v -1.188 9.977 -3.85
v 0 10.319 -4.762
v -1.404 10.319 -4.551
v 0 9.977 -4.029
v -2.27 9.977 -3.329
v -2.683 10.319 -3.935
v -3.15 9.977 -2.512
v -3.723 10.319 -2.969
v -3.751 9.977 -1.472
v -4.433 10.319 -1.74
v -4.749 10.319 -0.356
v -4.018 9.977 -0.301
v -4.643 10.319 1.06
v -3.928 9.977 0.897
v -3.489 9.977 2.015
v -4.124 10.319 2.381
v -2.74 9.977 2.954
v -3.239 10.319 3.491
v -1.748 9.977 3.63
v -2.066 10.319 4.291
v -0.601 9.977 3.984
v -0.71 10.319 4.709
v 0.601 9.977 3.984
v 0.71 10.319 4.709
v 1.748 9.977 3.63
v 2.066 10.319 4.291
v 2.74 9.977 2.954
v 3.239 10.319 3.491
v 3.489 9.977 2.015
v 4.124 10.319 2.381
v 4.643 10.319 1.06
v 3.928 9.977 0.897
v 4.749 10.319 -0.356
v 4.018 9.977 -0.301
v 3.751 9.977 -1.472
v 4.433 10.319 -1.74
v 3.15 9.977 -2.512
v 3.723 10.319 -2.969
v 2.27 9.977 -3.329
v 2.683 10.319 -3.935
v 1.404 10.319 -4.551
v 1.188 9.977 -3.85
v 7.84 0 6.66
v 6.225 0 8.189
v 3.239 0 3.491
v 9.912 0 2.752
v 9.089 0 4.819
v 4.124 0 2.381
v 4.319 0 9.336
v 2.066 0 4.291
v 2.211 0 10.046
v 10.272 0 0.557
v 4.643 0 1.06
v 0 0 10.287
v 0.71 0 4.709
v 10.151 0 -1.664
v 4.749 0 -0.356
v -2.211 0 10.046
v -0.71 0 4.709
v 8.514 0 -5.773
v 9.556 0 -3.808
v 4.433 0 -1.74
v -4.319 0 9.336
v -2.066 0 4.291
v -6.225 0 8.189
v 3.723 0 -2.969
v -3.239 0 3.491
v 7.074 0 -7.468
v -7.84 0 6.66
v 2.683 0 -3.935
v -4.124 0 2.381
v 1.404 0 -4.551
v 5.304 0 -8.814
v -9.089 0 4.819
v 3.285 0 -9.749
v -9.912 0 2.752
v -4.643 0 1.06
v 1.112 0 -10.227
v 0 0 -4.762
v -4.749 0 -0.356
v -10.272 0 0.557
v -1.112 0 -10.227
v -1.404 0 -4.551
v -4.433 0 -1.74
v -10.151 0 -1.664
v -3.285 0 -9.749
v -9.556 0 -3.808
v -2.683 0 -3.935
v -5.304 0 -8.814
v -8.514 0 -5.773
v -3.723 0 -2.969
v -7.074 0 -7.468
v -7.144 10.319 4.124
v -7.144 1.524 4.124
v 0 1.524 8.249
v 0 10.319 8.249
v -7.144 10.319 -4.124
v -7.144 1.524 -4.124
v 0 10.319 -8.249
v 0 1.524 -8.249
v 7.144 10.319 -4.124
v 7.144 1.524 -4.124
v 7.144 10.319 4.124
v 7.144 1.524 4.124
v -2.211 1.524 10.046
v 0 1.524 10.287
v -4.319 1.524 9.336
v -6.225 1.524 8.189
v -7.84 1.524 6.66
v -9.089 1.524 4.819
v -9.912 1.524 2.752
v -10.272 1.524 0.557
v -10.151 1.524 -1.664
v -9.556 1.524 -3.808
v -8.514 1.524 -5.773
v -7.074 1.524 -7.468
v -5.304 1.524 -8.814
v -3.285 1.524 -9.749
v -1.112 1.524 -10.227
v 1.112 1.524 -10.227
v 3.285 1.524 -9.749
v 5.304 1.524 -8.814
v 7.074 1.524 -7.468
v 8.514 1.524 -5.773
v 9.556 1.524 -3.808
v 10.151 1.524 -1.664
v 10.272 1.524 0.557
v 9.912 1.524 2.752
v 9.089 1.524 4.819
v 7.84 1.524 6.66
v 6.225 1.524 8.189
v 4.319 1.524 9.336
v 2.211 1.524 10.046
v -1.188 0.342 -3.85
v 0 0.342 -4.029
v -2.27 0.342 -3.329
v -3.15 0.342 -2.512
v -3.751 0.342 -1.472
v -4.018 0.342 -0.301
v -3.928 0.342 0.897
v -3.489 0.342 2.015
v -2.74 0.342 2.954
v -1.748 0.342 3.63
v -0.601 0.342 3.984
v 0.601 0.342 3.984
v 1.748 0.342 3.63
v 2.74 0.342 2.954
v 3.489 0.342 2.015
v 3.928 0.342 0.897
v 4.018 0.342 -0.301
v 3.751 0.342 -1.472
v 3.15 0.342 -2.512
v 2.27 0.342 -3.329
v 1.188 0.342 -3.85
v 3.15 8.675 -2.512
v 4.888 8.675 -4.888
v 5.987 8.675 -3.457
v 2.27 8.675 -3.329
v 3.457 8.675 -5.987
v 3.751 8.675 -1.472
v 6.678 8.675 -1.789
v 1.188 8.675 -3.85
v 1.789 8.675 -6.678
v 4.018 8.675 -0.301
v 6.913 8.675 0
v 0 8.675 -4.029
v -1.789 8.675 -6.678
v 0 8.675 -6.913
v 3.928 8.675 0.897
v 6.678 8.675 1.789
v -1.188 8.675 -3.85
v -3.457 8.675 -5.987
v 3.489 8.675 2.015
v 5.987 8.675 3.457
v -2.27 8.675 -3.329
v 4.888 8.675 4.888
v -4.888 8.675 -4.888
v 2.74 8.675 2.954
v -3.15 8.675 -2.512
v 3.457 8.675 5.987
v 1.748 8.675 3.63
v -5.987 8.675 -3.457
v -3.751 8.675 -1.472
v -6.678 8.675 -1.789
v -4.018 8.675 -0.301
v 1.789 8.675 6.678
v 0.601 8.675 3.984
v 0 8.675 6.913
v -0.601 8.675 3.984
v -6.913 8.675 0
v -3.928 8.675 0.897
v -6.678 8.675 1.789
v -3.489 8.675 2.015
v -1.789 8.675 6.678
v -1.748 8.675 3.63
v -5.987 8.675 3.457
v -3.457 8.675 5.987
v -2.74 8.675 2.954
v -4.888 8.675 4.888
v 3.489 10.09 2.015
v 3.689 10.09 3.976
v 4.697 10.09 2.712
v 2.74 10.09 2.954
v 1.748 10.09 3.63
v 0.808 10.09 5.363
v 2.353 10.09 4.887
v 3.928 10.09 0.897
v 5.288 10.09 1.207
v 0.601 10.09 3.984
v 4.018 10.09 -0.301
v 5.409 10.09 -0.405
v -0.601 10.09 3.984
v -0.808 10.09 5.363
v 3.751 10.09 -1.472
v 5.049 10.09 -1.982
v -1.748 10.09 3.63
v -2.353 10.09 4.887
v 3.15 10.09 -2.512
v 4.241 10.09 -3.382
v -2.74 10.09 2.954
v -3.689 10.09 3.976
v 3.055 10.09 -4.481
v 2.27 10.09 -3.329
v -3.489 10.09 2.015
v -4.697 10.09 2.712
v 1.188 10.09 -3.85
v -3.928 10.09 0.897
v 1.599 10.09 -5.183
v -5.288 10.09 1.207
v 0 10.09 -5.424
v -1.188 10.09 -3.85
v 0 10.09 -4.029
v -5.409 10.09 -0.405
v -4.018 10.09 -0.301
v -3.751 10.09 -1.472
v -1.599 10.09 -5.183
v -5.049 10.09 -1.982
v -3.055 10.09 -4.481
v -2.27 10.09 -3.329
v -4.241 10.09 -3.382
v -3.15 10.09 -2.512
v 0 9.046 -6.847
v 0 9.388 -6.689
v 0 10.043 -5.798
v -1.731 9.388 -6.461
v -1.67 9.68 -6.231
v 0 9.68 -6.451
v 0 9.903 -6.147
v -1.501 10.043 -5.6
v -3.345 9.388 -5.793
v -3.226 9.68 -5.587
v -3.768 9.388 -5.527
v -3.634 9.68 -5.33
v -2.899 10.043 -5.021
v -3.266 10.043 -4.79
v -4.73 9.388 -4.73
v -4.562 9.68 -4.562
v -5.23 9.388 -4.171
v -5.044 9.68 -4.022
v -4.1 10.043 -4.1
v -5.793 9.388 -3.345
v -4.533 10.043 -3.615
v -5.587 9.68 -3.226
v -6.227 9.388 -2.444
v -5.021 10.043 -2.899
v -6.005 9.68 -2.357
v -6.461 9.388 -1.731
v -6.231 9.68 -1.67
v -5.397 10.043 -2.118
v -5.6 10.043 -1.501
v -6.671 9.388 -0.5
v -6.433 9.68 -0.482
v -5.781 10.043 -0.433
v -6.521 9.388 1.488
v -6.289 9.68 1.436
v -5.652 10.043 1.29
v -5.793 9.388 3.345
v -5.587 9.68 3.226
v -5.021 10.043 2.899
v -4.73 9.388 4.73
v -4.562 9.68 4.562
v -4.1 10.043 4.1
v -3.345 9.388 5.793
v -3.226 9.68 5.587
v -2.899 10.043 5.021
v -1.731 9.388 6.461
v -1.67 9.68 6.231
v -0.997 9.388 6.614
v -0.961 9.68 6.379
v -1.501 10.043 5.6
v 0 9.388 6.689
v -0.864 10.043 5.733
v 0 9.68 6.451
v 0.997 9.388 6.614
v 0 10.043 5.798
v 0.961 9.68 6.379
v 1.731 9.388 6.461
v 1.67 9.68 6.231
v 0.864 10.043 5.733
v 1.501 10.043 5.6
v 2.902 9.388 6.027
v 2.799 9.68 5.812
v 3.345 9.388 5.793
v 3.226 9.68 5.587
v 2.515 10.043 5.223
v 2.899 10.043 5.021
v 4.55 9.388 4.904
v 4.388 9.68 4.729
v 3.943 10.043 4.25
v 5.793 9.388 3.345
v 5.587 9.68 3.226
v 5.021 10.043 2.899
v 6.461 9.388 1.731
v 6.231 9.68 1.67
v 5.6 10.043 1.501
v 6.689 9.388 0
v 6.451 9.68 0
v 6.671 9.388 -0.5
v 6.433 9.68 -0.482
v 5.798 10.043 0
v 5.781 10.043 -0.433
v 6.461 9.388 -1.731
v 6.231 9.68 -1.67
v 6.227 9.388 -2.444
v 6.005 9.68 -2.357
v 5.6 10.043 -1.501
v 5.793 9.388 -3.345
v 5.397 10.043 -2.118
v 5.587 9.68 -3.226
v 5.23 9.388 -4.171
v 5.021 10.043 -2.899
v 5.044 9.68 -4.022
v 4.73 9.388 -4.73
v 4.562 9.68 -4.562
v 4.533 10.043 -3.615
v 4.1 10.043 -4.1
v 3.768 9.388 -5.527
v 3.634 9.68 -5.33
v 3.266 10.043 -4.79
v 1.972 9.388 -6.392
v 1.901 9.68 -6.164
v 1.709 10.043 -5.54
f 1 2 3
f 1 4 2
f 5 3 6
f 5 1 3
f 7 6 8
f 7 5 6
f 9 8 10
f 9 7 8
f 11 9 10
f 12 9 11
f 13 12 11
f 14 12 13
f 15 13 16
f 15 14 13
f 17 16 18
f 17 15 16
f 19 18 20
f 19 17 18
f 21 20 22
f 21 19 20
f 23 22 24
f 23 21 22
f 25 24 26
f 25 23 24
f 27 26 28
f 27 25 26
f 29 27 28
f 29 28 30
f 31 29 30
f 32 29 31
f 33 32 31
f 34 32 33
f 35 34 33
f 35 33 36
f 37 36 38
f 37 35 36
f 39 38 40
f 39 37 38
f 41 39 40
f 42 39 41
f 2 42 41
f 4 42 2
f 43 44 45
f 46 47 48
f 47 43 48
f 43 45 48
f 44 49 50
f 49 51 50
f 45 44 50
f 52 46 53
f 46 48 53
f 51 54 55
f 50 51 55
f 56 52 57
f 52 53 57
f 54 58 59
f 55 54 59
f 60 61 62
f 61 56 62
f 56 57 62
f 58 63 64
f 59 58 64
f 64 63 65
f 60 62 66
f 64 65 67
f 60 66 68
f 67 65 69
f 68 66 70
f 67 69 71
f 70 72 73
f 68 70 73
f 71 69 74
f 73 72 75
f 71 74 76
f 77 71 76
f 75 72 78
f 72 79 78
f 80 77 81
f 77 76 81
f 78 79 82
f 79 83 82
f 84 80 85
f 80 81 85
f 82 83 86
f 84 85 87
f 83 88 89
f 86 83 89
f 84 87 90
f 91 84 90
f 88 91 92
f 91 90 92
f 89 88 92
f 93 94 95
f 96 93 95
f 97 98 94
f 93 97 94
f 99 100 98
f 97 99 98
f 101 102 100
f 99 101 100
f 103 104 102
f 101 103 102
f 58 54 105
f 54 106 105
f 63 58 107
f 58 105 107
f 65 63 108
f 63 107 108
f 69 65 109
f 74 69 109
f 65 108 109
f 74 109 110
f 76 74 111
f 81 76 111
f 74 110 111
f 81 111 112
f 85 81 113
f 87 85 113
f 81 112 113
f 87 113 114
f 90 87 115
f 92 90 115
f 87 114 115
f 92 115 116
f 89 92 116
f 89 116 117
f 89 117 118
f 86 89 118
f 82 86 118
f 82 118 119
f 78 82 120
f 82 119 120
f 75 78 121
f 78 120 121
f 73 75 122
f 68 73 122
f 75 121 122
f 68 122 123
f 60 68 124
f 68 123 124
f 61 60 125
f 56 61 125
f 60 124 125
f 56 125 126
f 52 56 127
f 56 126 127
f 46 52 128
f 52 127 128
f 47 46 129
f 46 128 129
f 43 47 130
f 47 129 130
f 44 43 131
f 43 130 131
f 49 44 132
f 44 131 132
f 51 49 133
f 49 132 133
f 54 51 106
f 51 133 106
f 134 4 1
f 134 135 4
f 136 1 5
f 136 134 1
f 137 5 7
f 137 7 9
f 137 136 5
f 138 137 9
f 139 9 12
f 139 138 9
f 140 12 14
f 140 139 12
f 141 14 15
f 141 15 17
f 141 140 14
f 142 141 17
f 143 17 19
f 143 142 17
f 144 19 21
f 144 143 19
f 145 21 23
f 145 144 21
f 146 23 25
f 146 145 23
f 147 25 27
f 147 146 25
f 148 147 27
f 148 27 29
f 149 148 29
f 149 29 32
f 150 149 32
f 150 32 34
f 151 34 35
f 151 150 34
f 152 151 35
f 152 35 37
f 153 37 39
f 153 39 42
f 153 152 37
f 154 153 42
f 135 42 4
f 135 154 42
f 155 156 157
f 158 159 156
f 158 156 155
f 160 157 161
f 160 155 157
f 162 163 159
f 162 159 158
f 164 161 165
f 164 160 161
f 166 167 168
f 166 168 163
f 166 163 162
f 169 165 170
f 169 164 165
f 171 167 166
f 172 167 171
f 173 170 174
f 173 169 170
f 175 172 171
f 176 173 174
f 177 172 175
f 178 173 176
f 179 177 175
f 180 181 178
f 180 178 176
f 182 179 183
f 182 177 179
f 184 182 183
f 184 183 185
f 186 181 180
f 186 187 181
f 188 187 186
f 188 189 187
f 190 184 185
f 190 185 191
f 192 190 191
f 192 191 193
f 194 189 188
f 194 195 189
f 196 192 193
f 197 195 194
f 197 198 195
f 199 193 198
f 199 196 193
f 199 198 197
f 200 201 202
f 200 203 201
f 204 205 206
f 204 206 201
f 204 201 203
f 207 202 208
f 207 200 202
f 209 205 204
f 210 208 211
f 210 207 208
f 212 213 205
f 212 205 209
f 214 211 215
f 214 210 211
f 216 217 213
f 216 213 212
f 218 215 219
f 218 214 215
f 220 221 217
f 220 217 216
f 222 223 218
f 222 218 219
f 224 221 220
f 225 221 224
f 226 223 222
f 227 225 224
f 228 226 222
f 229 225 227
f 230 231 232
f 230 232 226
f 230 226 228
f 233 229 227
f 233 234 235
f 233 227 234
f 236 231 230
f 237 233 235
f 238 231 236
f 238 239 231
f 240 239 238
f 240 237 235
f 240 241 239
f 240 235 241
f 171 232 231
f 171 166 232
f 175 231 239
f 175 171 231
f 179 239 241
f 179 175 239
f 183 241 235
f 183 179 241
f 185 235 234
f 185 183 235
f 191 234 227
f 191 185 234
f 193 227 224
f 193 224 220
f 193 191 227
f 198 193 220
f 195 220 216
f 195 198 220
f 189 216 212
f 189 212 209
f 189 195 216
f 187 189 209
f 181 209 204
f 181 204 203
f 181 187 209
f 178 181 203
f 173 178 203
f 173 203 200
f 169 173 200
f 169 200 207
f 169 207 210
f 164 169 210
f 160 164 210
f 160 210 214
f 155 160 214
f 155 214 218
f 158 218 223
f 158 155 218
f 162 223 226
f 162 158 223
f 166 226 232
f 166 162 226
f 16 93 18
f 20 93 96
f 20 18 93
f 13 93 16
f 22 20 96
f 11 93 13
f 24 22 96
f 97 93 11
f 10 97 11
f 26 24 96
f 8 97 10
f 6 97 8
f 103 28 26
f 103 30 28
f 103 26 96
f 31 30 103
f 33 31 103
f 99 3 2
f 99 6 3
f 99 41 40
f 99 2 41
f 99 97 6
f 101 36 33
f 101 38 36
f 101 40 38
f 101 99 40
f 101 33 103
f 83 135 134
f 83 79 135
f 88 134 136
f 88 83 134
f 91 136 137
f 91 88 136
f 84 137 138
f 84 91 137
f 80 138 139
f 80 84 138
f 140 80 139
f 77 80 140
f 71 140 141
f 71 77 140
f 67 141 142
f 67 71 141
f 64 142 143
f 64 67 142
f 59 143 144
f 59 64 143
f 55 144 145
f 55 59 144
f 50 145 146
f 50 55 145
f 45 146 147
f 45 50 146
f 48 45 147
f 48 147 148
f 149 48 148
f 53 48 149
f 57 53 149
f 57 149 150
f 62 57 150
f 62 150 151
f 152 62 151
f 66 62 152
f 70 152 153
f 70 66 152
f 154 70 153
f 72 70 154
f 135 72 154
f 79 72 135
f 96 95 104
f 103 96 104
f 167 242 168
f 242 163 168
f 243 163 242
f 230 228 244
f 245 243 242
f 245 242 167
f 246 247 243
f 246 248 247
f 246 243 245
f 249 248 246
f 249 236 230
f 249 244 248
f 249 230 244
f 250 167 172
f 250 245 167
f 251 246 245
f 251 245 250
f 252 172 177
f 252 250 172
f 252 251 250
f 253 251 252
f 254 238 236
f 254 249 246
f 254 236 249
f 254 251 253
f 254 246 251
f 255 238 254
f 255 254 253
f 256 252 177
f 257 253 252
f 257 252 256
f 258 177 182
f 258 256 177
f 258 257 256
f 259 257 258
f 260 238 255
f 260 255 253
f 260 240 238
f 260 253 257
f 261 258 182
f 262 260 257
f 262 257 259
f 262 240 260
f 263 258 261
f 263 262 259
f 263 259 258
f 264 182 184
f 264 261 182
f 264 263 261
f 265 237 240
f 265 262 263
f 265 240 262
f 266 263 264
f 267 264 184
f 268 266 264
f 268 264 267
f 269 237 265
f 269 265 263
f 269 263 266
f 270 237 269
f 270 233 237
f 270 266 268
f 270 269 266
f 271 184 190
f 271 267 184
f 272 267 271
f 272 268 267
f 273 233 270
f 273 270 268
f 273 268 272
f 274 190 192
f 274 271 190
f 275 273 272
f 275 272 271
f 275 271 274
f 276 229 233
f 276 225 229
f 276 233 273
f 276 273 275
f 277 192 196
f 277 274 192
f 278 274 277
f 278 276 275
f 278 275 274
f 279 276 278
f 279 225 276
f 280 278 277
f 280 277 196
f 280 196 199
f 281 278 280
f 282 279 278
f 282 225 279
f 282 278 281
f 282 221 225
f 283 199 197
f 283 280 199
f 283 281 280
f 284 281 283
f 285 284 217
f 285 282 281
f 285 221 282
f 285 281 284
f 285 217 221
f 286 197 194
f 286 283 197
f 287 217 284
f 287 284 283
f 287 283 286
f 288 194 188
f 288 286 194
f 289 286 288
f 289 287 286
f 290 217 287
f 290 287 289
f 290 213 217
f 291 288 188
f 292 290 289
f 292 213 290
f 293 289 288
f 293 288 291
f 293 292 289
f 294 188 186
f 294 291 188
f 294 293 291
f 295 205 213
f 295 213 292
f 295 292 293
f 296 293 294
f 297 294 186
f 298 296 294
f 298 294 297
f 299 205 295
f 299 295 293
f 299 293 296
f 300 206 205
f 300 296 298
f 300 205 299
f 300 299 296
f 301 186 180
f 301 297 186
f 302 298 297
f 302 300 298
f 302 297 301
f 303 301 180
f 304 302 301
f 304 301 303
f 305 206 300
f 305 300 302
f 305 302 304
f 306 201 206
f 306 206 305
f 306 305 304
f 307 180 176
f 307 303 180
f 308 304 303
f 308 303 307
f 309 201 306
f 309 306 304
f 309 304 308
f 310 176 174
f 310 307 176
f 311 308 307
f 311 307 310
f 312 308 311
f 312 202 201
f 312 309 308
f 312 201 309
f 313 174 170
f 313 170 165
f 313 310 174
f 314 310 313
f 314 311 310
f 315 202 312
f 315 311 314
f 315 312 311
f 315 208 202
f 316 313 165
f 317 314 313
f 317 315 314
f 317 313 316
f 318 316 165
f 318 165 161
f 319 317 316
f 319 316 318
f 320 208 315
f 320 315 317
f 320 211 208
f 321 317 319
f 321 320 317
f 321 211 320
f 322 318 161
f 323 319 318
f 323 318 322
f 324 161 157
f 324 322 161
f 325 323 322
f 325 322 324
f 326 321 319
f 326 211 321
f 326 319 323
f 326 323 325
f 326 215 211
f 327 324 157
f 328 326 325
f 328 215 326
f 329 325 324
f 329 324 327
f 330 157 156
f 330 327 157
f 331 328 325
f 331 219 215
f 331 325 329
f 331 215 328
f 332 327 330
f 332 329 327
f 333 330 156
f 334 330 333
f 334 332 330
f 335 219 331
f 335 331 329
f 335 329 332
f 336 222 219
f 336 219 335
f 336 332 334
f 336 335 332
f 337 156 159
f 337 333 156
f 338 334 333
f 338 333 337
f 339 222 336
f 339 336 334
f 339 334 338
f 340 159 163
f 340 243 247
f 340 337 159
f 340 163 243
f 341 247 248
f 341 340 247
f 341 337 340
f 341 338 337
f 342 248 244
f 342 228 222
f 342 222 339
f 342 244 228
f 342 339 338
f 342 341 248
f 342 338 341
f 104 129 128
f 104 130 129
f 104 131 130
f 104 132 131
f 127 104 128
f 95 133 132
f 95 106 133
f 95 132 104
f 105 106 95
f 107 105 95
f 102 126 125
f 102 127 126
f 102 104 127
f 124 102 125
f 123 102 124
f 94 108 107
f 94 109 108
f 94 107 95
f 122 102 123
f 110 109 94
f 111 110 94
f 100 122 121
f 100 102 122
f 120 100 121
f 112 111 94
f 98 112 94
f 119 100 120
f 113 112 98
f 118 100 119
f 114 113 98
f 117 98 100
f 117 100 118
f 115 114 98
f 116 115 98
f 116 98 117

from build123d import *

# Parameters (mm, degrees)
EXTRUDE1_DEPTH = 10.31875
SKETCH8_W      = 10.287
SKETCH8_H      = 1.524


with BuildPart() as part:
    # Sketch1 → Extrude1 (new body)
    with BuildSketch(Plane(origin=(0, 0, 0), x_dir=(1, 0, 0), z_dir=(0, 1, 0))):
        Polygon((0, 8.248891971), (-7.14375, 4.124445986), (-7.14375, -4.124445986), (0, -8.248891971), (7.14375, -4.124445986), (7.14375, 4.124445986), align=None)
    extrude(amount=EXTRUDE1_DEPTH)

    # Sketch8 → Revolve3 (revolve)
    with BuildSketch(Plane(origin=(0, 0, 0), x_dir=(0, 0, -1), z_dir=(1, 0, 0)), mode=Mode.PRIVATE) as revolve3_sk:
        with Locations((5.1435, 0.762)):
            Rectangle(SKETCH8_W, SKETCH8_H)
    revolve(revolve3_sk.sketch.rotate(Axis((0, 0, 0), (0, -1, 0)), 180), axis=Axis((0, 0, 0), (0, -1, 0)))

    # Sketch4 → Cut-Revolve2 (revolve, cut)
    with BuildSketch(Plane(origin=(0, 0, 0), x_dir=(0, 0, -1), z_dir=(1, 0, 0))):
        Polygon((0, 10.31875), (4.7625, 10.31875), (4.029111805, 9.976765468), (4.029111805, 0.341984532), (4.7625, 0), (0, 0), align=None)
    revolve(axis=Axis((0, 10.31875, 0), (0, 1, 0)), mode=Mode.SUBTRACT)


with BuildPart() as body_2:
    # Sketch7 → Revolve2 (revolve)
    with BuildSketch(Plane(origin=(0, 0, 0), x_dir=(0, 0, -1), z_dir=(1, 0, 0))):
        with BuildLine():
            Line((4.029111805, 8.675158333), (6.913201815, 8.675158333))
            ThreePointArc((6.913201815, 8.675158333), (6.451096051, 9.679995195), (5.423958333, 10.09015))
            Line((5.423958333, 10.09015), (4.029111805, 10.09015))
            Line((4.029111805, 10.09015), (4.029111805, 8.675158333))
        make_face()
    revolve(axis=Axis((0, 8.675158333, 0), (0, 1, 0)))


solid = Compound([part.part, body_2.part])
